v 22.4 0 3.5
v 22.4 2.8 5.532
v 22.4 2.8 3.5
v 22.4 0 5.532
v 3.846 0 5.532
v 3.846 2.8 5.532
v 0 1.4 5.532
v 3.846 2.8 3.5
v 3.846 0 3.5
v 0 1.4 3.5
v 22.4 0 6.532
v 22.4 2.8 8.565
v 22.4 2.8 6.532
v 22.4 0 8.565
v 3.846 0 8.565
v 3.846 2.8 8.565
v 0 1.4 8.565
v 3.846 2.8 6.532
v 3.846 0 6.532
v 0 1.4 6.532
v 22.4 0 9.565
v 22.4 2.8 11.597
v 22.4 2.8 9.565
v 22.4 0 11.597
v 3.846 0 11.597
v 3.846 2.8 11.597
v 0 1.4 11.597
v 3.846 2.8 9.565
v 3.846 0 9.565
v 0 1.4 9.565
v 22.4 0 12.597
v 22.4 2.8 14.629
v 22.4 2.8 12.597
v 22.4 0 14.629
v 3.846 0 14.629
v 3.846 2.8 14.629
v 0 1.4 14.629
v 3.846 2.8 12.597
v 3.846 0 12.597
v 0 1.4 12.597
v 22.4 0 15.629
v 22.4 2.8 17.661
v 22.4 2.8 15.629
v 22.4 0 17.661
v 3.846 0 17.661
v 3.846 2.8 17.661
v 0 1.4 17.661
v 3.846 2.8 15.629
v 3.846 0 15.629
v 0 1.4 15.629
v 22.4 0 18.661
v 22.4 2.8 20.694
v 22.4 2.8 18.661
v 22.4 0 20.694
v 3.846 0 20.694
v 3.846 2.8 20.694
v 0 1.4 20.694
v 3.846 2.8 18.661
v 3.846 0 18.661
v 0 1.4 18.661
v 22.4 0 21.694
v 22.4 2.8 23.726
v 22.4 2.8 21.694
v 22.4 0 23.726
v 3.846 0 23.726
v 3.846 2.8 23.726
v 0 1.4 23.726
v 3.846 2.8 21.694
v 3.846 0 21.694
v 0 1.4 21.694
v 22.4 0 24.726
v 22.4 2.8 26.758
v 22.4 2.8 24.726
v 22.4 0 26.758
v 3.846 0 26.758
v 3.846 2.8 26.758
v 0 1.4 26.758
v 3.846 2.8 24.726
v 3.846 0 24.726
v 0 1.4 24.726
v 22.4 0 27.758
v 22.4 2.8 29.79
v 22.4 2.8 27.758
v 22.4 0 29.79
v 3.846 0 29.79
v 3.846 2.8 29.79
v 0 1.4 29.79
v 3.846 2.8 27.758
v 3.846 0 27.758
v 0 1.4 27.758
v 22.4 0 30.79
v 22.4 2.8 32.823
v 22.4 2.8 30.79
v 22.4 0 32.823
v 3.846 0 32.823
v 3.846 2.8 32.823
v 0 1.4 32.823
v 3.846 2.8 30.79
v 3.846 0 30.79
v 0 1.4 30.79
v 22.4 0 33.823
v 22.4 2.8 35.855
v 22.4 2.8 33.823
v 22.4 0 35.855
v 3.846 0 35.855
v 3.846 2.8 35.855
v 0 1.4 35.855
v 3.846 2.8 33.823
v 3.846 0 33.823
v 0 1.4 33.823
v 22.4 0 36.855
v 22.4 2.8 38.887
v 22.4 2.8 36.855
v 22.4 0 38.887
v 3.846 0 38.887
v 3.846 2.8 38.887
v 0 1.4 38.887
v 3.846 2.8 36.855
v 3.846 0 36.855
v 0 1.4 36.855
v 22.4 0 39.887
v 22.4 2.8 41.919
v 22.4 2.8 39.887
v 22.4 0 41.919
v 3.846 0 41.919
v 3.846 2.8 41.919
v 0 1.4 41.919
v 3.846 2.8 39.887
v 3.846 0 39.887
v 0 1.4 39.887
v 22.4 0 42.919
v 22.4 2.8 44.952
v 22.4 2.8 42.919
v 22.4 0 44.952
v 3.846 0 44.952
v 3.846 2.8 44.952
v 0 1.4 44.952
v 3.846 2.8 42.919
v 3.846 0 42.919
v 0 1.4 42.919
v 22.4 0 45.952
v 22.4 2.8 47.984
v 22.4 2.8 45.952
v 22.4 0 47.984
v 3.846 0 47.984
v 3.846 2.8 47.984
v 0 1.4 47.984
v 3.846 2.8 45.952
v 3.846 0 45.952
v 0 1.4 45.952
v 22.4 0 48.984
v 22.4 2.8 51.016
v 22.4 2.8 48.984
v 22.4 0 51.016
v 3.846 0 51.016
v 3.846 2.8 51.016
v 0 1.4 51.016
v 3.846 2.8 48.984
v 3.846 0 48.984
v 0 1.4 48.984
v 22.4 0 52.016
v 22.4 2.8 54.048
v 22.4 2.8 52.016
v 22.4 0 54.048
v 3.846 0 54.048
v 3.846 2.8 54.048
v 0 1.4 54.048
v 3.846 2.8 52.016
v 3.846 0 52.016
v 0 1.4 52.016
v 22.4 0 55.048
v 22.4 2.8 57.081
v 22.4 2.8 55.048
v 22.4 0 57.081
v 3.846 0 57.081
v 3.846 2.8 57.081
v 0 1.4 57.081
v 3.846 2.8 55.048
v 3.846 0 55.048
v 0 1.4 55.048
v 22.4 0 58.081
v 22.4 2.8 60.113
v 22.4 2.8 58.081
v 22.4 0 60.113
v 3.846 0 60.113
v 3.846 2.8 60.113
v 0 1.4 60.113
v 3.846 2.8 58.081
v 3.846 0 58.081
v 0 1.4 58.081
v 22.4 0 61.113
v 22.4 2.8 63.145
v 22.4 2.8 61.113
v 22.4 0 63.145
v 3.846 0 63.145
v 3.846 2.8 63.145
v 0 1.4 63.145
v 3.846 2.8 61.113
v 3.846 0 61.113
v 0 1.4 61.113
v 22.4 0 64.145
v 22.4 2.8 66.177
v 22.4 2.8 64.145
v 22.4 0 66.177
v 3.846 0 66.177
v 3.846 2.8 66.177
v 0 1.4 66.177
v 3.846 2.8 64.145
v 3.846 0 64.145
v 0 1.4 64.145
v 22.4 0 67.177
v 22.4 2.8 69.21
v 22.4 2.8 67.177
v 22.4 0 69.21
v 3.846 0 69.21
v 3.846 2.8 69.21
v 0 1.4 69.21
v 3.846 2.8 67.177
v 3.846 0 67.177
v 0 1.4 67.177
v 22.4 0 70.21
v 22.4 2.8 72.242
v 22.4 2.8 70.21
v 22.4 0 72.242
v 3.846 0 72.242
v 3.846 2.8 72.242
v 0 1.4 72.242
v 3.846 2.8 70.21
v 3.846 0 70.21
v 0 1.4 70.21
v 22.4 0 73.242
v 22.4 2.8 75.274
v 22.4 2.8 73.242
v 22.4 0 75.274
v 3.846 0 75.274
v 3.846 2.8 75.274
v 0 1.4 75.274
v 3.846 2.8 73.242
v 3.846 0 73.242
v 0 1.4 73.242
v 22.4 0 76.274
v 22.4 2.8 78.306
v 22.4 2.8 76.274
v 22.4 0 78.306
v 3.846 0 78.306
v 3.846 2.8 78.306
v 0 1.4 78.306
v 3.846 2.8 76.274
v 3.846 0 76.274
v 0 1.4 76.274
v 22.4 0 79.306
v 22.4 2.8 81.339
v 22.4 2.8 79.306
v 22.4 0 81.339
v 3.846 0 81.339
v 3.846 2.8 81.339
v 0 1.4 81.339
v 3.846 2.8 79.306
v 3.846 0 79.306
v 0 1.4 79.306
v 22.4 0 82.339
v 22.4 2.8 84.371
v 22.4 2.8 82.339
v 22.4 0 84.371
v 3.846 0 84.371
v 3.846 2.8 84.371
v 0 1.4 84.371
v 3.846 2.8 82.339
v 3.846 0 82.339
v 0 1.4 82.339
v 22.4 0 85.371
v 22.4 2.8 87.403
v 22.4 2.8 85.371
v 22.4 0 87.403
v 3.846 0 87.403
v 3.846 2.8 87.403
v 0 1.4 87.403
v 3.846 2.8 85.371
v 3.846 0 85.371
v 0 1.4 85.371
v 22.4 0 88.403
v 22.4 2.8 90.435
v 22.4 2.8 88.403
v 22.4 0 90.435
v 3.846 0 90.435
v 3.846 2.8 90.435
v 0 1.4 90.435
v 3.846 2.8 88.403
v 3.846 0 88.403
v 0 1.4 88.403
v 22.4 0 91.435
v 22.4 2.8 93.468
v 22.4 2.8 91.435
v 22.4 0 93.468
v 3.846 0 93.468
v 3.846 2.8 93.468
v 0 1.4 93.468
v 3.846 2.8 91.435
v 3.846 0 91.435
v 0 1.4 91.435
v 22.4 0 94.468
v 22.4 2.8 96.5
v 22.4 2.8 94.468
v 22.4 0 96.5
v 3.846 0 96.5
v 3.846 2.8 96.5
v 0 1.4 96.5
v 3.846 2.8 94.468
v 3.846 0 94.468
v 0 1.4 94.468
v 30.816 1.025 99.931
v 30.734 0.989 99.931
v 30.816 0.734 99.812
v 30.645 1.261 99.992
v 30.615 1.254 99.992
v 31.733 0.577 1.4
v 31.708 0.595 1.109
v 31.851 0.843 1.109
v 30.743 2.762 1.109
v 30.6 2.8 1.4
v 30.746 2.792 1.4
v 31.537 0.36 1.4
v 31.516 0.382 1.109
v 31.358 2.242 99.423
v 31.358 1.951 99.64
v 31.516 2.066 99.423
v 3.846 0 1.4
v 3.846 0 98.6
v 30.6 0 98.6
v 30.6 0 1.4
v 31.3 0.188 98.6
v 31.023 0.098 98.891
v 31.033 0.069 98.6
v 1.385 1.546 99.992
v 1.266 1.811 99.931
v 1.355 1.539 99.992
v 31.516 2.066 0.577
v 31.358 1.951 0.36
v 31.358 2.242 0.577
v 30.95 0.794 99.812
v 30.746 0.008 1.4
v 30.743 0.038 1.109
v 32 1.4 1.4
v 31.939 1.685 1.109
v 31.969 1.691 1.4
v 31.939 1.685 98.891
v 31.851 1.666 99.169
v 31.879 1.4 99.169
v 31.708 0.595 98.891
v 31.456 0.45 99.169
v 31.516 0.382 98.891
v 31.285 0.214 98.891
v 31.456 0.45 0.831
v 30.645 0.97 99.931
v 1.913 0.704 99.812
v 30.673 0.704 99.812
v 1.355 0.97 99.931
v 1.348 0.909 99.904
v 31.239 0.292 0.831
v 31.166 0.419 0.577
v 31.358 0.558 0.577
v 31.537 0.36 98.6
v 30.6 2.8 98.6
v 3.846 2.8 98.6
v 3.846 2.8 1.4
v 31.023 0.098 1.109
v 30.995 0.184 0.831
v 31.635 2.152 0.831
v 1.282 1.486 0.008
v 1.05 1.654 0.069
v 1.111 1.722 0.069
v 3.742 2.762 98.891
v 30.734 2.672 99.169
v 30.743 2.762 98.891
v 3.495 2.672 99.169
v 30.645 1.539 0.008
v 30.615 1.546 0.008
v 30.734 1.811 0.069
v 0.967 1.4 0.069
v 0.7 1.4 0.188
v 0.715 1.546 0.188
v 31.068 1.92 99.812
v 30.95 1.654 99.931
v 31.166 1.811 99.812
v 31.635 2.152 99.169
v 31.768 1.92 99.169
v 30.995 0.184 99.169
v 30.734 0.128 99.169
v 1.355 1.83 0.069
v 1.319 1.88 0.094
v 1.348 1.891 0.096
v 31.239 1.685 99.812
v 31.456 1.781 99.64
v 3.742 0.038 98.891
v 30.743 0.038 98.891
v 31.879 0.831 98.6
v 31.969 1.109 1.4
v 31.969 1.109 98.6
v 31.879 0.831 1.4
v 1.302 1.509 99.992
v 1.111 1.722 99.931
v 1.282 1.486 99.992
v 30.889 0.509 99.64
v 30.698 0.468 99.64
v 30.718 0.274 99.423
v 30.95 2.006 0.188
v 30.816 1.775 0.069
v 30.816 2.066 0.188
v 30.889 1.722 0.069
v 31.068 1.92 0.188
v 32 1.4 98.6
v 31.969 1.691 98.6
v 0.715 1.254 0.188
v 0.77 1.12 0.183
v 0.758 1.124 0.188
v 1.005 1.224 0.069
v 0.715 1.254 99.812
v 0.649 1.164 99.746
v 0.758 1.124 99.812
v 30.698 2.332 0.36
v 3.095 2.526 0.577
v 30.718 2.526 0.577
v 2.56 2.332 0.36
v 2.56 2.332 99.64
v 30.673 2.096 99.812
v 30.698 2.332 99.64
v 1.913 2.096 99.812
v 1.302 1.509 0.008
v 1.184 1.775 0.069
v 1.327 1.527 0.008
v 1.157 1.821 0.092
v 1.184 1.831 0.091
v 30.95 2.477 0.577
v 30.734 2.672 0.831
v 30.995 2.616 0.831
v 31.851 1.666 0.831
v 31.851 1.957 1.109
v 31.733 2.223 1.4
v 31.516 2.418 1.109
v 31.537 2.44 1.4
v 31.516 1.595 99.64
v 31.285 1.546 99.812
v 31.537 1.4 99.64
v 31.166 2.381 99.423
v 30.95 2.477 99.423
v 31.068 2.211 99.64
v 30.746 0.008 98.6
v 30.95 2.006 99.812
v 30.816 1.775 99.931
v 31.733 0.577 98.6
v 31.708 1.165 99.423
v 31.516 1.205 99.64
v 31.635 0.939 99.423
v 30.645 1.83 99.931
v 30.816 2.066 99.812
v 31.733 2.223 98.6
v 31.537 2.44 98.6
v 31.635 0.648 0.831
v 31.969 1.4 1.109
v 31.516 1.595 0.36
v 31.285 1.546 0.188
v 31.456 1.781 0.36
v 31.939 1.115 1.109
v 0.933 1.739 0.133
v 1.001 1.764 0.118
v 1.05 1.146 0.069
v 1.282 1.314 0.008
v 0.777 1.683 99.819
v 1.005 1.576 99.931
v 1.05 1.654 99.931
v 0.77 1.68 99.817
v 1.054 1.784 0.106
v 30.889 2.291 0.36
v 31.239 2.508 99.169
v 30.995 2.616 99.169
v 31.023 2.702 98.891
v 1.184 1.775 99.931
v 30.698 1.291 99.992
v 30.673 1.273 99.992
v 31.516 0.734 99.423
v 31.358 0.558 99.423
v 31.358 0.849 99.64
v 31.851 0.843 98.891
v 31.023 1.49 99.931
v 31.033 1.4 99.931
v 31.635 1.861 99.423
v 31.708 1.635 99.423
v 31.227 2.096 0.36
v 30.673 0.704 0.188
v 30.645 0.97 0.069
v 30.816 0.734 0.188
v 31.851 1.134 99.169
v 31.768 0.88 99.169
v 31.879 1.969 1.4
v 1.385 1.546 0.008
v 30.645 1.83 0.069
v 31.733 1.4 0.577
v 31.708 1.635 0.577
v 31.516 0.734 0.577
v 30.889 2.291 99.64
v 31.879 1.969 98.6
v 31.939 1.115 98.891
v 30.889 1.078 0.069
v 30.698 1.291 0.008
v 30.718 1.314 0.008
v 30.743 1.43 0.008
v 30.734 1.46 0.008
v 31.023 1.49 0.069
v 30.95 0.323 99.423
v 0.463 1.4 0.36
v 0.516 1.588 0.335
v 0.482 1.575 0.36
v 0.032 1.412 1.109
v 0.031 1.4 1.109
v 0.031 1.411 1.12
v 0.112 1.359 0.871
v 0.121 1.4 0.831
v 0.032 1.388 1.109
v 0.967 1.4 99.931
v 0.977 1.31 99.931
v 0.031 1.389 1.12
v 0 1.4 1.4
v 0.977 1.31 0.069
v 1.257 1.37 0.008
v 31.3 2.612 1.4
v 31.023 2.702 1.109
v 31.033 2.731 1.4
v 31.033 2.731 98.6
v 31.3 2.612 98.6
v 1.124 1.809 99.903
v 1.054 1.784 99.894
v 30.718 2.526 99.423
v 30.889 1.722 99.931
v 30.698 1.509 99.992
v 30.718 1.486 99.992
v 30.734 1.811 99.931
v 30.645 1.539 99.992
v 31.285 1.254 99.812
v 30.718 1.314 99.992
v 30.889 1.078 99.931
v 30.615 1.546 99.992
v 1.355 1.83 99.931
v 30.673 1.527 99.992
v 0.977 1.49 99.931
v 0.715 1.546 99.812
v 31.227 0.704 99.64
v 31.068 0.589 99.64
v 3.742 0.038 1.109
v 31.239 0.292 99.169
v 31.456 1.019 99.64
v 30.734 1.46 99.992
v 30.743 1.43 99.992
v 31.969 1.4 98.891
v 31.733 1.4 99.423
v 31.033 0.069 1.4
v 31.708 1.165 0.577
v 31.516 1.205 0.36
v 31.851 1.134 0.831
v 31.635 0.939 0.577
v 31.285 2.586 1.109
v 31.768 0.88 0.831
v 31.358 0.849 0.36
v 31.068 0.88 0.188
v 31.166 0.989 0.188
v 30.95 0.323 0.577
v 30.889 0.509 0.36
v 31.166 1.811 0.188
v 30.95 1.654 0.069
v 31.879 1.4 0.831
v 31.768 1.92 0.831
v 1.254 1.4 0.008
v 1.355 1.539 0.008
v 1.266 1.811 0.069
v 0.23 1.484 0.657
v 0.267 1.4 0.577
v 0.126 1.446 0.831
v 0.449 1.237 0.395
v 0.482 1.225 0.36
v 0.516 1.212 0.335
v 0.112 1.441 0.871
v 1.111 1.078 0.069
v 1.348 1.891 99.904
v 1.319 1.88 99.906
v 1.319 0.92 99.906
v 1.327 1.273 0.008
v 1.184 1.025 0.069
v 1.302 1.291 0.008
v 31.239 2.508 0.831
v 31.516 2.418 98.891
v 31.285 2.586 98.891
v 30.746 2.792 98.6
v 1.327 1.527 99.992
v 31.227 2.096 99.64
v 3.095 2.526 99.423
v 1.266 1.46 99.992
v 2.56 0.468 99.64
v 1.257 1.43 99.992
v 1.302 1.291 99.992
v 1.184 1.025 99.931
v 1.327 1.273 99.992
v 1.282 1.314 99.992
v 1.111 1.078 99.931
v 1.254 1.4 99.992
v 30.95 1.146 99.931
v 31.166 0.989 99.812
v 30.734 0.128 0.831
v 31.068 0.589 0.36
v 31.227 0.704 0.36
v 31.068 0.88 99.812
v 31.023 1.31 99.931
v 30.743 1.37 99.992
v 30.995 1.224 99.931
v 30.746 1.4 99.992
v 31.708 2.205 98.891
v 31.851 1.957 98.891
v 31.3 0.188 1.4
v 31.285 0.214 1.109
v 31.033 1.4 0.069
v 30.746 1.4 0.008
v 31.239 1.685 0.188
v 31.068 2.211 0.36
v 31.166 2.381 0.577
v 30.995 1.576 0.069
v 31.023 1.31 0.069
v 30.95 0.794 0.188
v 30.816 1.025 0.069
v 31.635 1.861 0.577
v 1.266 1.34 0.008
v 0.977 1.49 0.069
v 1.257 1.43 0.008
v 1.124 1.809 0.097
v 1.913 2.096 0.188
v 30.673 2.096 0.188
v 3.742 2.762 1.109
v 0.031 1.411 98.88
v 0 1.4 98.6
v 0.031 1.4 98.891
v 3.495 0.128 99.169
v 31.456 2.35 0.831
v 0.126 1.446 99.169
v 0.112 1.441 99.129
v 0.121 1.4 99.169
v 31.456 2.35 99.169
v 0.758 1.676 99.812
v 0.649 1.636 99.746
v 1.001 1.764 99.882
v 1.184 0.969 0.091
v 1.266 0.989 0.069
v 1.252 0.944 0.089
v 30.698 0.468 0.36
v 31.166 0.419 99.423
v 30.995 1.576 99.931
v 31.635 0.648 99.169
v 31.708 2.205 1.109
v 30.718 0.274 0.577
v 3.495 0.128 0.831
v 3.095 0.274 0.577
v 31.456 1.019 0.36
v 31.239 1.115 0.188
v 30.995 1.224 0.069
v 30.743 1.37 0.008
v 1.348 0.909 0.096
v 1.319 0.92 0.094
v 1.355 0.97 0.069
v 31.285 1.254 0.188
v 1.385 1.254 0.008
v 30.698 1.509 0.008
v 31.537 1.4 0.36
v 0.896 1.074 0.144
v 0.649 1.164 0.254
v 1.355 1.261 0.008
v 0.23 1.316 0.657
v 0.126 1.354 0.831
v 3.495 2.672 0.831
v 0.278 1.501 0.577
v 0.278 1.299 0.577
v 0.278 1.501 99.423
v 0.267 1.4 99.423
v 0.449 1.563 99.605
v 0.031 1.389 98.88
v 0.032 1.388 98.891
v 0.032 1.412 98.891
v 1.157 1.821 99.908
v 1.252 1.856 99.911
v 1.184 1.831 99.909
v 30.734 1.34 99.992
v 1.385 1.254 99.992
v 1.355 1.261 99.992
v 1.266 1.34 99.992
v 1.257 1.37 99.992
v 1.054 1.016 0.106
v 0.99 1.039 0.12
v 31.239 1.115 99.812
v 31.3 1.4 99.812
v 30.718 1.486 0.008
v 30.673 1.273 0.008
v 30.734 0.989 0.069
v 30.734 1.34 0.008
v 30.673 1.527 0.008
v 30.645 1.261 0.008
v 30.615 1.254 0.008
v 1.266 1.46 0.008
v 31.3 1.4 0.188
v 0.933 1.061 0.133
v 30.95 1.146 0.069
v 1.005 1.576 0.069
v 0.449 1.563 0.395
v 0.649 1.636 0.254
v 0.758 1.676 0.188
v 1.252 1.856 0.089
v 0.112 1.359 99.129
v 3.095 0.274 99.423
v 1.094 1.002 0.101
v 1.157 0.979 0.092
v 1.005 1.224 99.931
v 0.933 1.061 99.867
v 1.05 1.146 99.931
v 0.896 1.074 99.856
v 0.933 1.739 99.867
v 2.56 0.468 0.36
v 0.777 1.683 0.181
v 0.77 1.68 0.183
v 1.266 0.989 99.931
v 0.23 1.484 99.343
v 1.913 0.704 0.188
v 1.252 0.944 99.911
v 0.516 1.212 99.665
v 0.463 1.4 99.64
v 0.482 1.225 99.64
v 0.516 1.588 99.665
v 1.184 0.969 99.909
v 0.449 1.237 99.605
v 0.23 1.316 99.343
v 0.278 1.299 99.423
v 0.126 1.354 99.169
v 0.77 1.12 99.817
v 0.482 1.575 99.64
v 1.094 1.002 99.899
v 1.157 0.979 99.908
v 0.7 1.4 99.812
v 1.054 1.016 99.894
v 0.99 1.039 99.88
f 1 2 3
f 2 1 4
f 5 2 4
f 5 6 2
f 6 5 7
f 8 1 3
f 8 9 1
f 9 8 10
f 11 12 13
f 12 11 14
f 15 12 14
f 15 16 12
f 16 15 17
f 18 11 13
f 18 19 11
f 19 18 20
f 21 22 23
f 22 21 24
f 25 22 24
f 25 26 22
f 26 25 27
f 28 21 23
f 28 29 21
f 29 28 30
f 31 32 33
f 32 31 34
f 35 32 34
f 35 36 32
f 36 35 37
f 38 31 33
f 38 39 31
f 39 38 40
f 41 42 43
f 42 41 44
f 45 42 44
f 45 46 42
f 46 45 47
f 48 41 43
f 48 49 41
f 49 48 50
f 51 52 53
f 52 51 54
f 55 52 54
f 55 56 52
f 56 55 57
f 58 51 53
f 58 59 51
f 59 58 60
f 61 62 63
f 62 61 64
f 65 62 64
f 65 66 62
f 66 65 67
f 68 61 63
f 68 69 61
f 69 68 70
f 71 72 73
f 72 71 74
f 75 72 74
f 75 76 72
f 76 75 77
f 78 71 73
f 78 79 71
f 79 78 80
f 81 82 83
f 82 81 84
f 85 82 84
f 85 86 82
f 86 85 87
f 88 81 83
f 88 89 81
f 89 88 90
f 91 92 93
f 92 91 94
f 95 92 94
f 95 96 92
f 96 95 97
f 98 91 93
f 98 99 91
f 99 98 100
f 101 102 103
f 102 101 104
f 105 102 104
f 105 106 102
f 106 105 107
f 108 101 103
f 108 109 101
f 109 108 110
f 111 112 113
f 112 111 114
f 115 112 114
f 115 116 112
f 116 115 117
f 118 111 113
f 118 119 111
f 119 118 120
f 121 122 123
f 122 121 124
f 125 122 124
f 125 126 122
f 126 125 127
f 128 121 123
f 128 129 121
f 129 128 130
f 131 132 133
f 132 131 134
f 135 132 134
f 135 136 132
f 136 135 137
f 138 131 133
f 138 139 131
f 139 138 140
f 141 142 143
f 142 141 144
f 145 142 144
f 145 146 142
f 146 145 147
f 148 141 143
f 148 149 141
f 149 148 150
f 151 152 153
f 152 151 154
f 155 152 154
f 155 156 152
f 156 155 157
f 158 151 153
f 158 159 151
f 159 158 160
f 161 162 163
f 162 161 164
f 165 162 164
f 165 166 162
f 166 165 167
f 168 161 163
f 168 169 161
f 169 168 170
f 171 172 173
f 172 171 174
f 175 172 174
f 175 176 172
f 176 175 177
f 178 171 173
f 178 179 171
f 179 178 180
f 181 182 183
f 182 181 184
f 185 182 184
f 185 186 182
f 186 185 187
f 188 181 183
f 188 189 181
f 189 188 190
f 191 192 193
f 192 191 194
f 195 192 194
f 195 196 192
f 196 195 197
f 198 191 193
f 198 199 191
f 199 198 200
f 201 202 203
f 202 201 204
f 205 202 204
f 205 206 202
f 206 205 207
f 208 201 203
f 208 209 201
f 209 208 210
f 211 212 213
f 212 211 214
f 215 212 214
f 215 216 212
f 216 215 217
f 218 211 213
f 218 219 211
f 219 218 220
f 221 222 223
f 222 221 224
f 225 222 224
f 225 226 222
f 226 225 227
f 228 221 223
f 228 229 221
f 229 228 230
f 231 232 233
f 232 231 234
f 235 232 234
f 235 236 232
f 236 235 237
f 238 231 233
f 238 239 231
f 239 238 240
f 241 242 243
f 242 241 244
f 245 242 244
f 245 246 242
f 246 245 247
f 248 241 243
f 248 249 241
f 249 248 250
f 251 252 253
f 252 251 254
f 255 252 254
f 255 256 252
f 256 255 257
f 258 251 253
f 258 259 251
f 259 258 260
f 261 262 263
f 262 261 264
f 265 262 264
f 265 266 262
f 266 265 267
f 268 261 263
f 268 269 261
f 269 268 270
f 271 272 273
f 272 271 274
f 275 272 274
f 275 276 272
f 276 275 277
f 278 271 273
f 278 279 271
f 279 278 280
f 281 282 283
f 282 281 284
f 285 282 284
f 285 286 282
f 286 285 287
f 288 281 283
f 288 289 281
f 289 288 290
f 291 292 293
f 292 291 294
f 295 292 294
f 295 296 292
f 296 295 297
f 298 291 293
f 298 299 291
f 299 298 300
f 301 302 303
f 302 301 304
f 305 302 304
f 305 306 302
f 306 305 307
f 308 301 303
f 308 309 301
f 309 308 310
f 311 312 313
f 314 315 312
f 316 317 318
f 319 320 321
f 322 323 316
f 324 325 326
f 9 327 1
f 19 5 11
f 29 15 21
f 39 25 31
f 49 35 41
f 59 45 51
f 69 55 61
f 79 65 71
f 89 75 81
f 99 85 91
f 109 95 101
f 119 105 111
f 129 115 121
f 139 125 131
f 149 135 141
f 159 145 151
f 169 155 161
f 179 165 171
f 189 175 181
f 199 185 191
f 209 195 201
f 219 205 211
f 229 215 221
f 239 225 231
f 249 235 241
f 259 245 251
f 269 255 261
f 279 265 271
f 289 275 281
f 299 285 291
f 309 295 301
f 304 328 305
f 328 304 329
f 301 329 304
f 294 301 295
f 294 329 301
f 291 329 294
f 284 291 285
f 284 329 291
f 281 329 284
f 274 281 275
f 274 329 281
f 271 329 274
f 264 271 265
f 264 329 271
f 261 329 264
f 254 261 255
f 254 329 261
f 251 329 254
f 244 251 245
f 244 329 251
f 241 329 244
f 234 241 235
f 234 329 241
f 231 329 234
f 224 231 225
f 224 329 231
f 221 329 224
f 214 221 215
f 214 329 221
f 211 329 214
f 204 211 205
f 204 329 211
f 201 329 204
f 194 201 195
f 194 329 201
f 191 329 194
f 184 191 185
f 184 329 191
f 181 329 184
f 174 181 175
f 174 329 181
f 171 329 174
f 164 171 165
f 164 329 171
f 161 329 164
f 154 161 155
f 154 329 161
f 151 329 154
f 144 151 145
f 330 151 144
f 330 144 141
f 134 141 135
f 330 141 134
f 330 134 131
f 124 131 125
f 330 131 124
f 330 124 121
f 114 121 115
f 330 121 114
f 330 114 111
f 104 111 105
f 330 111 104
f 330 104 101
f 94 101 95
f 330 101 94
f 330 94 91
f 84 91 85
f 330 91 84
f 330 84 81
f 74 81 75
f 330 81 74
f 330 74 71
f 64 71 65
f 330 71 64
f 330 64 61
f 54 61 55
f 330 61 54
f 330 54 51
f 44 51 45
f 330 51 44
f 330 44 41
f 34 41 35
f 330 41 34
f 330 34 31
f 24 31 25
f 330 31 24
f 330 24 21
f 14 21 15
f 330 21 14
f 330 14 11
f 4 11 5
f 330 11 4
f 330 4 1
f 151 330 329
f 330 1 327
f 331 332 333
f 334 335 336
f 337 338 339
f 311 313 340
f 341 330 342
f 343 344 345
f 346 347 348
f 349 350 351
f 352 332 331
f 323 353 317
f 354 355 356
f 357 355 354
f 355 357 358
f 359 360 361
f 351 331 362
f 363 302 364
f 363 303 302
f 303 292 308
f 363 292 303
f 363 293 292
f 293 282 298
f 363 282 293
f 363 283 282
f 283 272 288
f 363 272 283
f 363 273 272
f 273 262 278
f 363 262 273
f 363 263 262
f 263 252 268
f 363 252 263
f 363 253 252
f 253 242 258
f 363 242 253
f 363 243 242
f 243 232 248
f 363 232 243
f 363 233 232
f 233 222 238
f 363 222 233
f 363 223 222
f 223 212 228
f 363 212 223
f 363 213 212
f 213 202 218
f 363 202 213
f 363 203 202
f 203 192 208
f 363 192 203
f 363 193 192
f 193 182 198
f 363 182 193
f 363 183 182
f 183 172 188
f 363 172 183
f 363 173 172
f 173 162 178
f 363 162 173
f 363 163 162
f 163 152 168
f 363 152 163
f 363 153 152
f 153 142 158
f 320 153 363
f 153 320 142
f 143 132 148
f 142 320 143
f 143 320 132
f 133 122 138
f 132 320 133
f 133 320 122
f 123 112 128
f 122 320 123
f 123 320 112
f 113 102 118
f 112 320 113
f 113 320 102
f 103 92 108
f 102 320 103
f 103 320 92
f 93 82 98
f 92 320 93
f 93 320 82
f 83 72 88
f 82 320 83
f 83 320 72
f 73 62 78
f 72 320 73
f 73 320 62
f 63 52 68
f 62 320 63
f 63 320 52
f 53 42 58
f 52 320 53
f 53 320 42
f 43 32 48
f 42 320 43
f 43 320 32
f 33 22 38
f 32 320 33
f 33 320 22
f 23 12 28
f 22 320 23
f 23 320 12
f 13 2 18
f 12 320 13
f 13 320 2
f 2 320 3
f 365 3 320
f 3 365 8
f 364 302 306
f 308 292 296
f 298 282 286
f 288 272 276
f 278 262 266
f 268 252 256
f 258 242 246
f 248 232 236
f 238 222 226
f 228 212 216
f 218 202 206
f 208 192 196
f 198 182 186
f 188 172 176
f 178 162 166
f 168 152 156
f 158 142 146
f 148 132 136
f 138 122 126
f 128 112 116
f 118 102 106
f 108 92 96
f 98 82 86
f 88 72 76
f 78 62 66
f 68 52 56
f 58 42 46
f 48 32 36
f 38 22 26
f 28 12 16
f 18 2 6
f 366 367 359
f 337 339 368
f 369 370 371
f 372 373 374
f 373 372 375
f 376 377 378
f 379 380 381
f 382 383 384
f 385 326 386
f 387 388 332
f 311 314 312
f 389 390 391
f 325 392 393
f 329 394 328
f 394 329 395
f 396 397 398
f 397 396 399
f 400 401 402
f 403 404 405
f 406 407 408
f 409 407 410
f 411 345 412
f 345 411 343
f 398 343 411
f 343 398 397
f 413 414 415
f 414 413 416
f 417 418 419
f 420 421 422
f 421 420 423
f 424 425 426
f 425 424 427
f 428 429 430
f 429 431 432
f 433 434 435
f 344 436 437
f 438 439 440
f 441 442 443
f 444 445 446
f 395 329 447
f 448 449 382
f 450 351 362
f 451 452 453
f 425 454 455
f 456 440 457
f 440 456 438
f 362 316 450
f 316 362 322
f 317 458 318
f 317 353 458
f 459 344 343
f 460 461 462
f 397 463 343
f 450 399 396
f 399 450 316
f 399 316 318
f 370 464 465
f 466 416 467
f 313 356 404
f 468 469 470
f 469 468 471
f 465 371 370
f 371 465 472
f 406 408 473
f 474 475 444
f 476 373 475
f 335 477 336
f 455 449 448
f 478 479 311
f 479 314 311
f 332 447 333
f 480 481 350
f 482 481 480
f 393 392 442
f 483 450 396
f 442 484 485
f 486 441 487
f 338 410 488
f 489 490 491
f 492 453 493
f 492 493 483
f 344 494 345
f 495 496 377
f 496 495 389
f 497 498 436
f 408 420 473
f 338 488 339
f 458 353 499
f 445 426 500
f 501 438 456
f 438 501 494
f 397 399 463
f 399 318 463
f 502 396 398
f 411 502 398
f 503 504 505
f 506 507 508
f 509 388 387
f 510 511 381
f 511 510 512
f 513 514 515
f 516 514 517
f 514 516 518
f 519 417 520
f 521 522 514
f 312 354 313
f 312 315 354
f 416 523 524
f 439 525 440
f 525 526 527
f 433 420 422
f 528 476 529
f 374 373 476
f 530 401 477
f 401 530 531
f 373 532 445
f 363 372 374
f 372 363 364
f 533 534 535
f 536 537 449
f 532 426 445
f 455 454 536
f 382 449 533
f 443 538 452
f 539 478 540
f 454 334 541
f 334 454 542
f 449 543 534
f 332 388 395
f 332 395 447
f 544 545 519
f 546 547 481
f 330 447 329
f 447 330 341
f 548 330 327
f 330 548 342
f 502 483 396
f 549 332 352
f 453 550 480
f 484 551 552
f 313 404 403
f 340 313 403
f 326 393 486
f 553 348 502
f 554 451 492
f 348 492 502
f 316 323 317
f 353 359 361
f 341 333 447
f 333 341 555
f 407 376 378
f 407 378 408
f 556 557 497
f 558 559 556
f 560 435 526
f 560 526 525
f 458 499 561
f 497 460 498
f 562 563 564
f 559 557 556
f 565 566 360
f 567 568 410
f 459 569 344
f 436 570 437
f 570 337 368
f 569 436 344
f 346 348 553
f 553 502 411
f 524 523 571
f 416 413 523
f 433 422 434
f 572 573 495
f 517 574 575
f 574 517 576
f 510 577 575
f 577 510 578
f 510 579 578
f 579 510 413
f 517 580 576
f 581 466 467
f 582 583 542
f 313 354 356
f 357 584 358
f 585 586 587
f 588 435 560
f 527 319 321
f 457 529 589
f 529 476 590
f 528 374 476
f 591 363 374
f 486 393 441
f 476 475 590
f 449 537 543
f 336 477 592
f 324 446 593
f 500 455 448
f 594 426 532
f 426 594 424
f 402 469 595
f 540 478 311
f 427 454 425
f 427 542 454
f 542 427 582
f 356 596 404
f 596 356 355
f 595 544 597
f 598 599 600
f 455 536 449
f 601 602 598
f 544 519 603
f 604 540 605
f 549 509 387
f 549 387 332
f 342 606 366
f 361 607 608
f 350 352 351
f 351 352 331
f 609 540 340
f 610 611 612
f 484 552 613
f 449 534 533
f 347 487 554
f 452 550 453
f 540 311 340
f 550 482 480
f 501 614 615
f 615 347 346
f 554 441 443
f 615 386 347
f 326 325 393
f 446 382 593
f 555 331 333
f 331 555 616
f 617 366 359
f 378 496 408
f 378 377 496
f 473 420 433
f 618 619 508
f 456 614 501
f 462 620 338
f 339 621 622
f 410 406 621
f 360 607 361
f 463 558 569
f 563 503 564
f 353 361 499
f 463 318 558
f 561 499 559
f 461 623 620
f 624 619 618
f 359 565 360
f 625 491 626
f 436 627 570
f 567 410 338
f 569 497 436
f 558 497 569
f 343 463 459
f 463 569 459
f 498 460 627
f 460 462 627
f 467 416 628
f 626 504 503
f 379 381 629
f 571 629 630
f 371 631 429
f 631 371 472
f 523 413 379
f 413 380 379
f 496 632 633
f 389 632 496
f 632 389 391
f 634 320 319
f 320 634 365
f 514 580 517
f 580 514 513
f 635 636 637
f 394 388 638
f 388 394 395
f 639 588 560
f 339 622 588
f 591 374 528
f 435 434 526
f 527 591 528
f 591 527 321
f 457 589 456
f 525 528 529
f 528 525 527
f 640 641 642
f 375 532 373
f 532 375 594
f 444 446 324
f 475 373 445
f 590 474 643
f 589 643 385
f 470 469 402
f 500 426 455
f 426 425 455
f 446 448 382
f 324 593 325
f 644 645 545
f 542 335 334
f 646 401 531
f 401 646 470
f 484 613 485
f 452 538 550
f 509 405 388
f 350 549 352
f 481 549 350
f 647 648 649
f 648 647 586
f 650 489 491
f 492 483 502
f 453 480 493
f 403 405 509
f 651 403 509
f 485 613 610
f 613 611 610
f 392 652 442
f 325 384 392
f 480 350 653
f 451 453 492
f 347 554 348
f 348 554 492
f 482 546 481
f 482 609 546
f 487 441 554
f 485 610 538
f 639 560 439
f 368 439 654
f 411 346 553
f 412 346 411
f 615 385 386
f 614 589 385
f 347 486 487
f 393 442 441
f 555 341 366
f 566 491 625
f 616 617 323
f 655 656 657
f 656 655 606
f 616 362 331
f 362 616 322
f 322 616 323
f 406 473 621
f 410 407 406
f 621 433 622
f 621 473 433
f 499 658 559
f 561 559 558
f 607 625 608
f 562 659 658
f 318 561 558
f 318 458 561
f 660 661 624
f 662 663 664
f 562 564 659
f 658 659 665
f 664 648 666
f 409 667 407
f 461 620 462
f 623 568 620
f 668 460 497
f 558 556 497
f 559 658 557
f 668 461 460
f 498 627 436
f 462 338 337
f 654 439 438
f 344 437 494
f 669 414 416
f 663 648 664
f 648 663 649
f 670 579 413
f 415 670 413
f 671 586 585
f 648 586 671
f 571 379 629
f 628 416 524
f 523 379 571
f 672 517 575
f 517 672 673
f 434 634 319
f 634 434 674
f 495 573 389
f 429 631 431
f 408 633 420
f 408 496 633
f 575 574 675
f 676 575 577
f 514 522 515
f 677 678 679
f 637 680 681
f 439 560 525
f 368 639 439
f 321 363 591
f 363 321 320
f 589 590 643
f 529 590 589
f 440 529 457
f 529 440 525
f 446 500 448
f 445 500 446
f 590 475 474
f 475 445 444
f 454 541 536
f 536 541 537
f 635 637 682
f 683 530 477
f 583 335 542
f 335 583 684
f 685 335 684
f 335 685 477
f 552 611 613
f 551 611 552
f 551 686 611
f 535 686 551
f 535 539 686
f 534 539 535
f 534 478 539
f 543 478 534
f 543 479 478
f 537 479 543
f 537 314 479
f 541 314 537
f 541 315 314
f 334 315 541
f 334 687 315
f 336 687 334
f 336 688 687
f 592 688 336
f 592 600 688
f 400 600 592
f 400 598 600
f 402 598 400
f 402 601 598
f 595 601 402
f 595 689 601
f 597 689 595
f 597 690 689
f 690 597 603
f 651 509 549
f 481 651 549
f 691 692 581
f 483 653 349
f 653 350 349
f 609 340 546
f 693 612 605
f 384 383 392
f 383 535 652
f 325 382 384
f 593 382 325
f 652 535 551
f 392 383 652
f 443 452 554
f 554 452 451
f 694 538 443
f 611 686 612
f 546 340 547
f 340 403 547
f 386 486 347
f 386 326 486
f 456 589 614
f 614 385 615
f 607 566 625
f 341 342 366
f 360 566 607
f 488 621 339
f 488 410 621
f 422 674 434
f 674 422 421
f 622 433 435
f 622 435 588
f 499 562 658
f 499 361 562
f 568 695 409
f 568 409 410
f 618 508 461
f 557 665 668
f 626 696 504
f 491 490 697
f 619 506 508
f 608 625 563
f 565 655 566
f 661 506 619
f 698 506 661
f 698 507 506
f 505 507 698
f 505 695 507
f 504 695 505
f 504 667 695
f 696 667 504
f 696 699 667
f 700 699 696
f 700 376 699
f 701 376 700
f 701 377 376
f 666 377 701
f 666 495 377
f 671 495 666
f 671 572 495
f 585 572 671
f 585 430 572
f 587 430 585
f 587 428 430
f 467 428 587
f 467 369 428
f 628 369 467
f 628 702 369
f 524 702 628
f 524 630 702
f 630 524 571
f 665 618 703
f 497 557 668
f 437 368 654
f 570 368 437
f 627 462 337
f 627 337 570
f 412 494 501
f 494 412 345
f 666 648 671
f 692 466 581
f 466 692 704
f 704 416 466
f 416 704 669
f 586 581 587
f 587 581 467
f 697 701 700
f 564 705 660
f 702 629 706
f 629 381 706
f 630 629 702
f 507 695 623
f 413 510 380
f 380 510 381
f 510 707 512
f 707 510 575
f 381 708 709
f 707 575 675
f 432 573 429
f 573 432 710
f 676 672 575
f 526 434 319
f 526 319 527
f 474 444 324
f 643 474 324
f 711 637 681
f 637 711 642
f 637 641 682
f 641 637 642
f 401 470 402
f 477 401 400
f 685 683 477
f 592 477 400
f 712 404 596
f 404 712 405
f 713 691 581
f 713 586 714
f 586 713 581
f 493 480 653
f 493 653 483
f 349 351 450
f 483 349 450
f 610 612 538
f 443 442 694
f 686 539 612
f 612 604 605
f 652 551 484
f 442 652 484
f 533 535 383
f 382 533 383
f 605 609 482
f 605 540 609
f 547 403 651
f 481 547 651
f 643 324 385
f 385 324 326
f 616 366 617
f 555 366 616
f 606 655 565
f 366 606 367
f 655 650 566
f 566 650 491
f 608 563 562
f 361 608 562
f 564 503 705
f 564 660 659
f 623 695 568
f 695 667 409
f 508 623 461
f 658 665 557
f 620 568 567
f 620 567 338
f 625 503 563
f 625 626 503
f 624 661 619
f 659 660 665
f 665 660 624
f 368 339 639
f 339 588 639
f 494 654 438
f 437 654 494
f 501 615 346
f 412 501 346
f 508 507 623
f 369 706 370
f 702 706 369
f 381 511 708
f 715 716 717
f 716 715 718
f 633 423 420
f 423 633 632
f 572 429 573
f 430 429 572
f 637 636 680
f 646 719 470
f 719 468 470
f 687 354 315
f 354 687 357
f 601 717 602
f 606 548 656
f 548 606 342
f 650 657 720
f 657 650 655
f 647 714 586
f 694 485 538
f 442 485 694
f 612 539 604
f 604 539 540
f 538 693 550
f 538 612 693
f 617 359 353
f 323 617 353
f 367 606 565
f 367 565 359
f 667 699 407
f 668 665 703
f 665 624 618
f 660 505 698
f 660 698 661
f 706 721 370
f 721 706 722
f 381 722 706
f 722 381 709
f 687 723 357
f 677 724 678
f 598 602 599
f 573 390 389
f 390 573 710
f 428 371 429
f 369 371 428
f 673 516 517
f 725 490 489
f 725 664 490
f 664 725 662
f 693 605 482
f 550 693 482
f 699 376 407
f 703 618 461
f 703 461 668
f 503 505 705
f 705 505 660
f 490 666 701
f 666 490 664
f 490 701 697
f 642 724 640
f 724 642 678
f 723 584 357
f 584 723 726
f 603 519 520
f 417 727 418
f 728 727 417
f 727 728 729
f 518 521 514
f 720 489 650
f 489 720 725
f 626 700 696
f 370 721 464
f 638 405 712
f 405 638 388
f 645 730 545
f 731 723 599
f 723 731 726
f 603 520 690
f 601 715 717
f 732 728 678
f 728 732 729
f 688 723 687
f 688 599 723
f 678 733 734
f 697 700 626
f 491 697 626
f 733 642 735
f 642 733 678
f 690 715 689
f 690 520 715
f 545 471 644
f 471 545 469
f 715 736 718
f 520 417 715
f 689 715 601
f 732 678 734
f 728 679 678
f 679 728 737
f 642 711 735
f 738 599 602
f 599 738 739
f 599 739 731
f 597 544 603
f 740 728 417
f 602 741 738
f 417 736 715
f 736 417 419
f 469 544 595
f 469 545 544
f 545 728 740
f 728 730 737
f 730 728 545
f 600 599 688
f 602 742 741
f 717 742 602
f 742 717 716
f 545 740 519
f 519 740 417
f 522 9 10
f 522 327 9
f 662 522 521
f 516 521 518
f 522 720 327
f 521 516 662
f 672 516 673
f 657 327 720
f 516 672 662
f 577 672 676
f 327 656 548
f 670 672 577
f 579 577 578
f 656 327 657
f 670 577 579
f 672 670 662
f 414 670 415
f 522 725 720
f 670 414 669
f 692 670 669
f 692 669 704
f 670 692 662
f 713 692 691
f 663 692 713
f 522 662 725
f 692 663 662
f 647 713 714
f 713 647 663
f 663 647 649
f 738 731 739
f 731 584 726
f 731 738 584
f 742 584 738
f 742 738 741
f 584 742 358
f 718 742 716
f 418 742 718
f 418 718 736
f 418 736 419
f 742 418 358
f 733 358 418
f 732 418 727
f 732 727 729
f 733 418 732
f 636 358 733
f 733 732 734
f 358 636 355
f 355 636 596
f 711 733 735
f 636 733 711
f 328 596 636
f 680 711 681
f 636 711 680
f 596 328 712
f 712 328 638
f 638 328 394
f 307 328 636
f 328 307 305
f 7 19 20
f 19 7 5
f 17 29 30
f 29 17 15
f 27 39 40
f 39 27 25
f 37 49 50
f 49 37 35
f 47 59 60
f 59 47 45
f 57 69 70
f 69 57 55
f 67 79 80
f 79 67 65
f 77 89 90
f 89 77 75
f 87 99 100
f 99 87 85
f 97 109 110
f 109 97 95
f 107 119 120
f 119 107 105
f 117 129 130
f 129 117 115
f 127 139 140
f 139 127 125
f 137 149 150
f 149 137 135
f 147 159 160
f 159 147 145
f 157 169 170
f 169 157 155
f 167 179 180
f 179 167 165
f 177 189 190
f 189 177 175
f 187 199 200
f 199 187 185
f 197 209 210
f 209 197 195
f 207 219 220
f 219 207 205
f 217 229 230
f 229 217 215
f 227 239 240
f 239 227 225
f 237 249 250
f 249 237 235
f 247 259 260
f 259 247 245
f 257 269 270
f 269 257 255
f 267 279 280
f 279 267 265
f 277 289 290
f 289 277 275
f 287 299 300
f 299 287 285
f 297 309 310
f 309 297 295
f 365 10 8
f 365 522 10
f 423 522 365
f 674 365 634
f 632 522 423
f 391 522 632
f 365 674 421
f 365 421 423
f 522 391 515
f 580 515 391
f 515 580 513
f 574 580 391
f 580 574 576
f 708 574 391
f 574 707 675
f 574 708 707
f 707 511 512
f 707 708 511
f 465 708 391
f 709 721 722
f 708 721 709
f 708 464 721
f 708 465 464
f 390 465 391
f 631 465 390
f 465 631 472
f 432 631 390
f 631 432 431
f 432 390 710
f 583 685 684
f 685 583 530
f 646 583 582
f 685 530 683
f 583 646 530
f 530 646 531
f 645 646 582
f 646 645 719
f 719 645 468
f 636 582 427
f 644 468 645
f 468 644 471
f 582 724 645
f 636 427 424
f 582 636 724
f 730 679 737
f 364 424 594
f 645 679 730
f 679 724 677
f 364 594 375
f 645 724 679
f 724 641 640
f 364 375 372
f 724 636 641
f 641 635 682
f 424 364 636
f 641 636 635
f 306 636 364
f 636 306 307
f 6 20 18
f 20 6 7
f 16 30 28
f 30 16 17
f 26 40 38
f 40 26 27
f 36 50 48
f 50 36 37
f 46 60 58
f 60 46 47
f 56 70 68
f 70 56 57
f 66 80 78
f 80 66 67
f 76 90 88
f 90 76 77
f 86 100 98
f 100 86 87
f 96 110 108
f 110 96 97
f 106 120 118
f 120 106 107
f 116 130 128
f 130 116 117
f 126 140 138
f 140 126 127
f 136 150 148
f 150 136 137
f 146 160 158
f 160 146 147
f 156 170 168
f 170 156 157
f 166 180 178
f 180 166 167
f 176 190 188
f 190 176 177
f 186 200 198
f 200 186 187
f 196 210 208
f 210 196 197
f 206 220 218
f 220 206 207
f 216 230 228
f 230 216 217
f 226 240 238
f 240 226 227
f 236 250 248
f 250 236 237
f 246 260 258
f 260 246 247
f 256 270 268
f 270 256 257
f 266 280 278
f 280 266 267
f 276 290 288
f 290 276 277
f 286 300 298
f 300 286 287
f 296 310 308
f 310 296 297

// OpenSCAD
// ---- Dimensions

// Length of comb
length = 100;

// Height of comb
height = 32;

//Thickness of comb
thickness = 2.8;

// Number of teeth
numberOfTeeth = 30;

// Width of tooth
toothWidth = 1; //[0.5:0.1:3]

// Angle of tooth edge
toothCutAngle = 40; //[10:1:90]

// Handle height, expressed as a perentage (out of 100%) of overall height
handle_height=30; //[1:0.5:50]

// Side thickness, expressed as a perentage (out of 100%) of overall width
side_width=3.5; //[1:0.5:10]

// ---- Calculations

handleHeight= height*handle_height/100;
side = length * side_width/100;

workingWidth = length - 2 * side;
// workingWidth = numberOfTeeth * toothWidth + (numberOfTeeth + 1) * toothGap
toothGap = (workingWidth - numberOfTeeth * toothWidth) / (numberOfTeeth + 1);
toothStep = toothGap + toothWidth;

echo("workingWidth=", workingWidth, "toothWidth=", toothWidth, "toothGap=", toothGap, "toothStep=", toothStep);

// ---- Assemble

$fs = toothWidth / 10;

module base() {
  // cube with rounded corners
  hull() {
    translate([thickness / 2, 0, thickness / 2])
    cube(size = [height - thickness, thickness, length - thickness]);

    translate([thickness / 2, thickness / 2, thickness / 2])
    sphere(r = thickness / 2);

    translate([thickness / 2, thickness / 2, length - thickness / 2])
    sphere(r = thickness / 2);

    translate([height - thickness / 2, thickness / 2, length - thickness / 2])
    sphere(r = thickness / 2);

    translate([height - thickness / 2, thickness / 2, thickness / 2])
    sphere(r = thickness / 2);
  }
}

difference() {
  base();

  // cut teeth out
  for (i = [0 : numberOfTeeth]) {
    translate([-1, -100, side + i * toothStep])
    cube(size = [1 + height - handleHeight, 200, toothGap]);
  }

  // "sharpen" teeth
  translate([0, thickness / 2, -1])
  rotate(a=90-toothCutAngle / 2 + 180, v=[0, 0, 1])
  cube(size = [1000, 1000, length + 2]);

  translate([0, thickness / 2, -1])
  rotate(a=toothCutAngle / 2, v=[0, 0, 1])
  cube(size = [1000, 1000, length + 2]);
}
